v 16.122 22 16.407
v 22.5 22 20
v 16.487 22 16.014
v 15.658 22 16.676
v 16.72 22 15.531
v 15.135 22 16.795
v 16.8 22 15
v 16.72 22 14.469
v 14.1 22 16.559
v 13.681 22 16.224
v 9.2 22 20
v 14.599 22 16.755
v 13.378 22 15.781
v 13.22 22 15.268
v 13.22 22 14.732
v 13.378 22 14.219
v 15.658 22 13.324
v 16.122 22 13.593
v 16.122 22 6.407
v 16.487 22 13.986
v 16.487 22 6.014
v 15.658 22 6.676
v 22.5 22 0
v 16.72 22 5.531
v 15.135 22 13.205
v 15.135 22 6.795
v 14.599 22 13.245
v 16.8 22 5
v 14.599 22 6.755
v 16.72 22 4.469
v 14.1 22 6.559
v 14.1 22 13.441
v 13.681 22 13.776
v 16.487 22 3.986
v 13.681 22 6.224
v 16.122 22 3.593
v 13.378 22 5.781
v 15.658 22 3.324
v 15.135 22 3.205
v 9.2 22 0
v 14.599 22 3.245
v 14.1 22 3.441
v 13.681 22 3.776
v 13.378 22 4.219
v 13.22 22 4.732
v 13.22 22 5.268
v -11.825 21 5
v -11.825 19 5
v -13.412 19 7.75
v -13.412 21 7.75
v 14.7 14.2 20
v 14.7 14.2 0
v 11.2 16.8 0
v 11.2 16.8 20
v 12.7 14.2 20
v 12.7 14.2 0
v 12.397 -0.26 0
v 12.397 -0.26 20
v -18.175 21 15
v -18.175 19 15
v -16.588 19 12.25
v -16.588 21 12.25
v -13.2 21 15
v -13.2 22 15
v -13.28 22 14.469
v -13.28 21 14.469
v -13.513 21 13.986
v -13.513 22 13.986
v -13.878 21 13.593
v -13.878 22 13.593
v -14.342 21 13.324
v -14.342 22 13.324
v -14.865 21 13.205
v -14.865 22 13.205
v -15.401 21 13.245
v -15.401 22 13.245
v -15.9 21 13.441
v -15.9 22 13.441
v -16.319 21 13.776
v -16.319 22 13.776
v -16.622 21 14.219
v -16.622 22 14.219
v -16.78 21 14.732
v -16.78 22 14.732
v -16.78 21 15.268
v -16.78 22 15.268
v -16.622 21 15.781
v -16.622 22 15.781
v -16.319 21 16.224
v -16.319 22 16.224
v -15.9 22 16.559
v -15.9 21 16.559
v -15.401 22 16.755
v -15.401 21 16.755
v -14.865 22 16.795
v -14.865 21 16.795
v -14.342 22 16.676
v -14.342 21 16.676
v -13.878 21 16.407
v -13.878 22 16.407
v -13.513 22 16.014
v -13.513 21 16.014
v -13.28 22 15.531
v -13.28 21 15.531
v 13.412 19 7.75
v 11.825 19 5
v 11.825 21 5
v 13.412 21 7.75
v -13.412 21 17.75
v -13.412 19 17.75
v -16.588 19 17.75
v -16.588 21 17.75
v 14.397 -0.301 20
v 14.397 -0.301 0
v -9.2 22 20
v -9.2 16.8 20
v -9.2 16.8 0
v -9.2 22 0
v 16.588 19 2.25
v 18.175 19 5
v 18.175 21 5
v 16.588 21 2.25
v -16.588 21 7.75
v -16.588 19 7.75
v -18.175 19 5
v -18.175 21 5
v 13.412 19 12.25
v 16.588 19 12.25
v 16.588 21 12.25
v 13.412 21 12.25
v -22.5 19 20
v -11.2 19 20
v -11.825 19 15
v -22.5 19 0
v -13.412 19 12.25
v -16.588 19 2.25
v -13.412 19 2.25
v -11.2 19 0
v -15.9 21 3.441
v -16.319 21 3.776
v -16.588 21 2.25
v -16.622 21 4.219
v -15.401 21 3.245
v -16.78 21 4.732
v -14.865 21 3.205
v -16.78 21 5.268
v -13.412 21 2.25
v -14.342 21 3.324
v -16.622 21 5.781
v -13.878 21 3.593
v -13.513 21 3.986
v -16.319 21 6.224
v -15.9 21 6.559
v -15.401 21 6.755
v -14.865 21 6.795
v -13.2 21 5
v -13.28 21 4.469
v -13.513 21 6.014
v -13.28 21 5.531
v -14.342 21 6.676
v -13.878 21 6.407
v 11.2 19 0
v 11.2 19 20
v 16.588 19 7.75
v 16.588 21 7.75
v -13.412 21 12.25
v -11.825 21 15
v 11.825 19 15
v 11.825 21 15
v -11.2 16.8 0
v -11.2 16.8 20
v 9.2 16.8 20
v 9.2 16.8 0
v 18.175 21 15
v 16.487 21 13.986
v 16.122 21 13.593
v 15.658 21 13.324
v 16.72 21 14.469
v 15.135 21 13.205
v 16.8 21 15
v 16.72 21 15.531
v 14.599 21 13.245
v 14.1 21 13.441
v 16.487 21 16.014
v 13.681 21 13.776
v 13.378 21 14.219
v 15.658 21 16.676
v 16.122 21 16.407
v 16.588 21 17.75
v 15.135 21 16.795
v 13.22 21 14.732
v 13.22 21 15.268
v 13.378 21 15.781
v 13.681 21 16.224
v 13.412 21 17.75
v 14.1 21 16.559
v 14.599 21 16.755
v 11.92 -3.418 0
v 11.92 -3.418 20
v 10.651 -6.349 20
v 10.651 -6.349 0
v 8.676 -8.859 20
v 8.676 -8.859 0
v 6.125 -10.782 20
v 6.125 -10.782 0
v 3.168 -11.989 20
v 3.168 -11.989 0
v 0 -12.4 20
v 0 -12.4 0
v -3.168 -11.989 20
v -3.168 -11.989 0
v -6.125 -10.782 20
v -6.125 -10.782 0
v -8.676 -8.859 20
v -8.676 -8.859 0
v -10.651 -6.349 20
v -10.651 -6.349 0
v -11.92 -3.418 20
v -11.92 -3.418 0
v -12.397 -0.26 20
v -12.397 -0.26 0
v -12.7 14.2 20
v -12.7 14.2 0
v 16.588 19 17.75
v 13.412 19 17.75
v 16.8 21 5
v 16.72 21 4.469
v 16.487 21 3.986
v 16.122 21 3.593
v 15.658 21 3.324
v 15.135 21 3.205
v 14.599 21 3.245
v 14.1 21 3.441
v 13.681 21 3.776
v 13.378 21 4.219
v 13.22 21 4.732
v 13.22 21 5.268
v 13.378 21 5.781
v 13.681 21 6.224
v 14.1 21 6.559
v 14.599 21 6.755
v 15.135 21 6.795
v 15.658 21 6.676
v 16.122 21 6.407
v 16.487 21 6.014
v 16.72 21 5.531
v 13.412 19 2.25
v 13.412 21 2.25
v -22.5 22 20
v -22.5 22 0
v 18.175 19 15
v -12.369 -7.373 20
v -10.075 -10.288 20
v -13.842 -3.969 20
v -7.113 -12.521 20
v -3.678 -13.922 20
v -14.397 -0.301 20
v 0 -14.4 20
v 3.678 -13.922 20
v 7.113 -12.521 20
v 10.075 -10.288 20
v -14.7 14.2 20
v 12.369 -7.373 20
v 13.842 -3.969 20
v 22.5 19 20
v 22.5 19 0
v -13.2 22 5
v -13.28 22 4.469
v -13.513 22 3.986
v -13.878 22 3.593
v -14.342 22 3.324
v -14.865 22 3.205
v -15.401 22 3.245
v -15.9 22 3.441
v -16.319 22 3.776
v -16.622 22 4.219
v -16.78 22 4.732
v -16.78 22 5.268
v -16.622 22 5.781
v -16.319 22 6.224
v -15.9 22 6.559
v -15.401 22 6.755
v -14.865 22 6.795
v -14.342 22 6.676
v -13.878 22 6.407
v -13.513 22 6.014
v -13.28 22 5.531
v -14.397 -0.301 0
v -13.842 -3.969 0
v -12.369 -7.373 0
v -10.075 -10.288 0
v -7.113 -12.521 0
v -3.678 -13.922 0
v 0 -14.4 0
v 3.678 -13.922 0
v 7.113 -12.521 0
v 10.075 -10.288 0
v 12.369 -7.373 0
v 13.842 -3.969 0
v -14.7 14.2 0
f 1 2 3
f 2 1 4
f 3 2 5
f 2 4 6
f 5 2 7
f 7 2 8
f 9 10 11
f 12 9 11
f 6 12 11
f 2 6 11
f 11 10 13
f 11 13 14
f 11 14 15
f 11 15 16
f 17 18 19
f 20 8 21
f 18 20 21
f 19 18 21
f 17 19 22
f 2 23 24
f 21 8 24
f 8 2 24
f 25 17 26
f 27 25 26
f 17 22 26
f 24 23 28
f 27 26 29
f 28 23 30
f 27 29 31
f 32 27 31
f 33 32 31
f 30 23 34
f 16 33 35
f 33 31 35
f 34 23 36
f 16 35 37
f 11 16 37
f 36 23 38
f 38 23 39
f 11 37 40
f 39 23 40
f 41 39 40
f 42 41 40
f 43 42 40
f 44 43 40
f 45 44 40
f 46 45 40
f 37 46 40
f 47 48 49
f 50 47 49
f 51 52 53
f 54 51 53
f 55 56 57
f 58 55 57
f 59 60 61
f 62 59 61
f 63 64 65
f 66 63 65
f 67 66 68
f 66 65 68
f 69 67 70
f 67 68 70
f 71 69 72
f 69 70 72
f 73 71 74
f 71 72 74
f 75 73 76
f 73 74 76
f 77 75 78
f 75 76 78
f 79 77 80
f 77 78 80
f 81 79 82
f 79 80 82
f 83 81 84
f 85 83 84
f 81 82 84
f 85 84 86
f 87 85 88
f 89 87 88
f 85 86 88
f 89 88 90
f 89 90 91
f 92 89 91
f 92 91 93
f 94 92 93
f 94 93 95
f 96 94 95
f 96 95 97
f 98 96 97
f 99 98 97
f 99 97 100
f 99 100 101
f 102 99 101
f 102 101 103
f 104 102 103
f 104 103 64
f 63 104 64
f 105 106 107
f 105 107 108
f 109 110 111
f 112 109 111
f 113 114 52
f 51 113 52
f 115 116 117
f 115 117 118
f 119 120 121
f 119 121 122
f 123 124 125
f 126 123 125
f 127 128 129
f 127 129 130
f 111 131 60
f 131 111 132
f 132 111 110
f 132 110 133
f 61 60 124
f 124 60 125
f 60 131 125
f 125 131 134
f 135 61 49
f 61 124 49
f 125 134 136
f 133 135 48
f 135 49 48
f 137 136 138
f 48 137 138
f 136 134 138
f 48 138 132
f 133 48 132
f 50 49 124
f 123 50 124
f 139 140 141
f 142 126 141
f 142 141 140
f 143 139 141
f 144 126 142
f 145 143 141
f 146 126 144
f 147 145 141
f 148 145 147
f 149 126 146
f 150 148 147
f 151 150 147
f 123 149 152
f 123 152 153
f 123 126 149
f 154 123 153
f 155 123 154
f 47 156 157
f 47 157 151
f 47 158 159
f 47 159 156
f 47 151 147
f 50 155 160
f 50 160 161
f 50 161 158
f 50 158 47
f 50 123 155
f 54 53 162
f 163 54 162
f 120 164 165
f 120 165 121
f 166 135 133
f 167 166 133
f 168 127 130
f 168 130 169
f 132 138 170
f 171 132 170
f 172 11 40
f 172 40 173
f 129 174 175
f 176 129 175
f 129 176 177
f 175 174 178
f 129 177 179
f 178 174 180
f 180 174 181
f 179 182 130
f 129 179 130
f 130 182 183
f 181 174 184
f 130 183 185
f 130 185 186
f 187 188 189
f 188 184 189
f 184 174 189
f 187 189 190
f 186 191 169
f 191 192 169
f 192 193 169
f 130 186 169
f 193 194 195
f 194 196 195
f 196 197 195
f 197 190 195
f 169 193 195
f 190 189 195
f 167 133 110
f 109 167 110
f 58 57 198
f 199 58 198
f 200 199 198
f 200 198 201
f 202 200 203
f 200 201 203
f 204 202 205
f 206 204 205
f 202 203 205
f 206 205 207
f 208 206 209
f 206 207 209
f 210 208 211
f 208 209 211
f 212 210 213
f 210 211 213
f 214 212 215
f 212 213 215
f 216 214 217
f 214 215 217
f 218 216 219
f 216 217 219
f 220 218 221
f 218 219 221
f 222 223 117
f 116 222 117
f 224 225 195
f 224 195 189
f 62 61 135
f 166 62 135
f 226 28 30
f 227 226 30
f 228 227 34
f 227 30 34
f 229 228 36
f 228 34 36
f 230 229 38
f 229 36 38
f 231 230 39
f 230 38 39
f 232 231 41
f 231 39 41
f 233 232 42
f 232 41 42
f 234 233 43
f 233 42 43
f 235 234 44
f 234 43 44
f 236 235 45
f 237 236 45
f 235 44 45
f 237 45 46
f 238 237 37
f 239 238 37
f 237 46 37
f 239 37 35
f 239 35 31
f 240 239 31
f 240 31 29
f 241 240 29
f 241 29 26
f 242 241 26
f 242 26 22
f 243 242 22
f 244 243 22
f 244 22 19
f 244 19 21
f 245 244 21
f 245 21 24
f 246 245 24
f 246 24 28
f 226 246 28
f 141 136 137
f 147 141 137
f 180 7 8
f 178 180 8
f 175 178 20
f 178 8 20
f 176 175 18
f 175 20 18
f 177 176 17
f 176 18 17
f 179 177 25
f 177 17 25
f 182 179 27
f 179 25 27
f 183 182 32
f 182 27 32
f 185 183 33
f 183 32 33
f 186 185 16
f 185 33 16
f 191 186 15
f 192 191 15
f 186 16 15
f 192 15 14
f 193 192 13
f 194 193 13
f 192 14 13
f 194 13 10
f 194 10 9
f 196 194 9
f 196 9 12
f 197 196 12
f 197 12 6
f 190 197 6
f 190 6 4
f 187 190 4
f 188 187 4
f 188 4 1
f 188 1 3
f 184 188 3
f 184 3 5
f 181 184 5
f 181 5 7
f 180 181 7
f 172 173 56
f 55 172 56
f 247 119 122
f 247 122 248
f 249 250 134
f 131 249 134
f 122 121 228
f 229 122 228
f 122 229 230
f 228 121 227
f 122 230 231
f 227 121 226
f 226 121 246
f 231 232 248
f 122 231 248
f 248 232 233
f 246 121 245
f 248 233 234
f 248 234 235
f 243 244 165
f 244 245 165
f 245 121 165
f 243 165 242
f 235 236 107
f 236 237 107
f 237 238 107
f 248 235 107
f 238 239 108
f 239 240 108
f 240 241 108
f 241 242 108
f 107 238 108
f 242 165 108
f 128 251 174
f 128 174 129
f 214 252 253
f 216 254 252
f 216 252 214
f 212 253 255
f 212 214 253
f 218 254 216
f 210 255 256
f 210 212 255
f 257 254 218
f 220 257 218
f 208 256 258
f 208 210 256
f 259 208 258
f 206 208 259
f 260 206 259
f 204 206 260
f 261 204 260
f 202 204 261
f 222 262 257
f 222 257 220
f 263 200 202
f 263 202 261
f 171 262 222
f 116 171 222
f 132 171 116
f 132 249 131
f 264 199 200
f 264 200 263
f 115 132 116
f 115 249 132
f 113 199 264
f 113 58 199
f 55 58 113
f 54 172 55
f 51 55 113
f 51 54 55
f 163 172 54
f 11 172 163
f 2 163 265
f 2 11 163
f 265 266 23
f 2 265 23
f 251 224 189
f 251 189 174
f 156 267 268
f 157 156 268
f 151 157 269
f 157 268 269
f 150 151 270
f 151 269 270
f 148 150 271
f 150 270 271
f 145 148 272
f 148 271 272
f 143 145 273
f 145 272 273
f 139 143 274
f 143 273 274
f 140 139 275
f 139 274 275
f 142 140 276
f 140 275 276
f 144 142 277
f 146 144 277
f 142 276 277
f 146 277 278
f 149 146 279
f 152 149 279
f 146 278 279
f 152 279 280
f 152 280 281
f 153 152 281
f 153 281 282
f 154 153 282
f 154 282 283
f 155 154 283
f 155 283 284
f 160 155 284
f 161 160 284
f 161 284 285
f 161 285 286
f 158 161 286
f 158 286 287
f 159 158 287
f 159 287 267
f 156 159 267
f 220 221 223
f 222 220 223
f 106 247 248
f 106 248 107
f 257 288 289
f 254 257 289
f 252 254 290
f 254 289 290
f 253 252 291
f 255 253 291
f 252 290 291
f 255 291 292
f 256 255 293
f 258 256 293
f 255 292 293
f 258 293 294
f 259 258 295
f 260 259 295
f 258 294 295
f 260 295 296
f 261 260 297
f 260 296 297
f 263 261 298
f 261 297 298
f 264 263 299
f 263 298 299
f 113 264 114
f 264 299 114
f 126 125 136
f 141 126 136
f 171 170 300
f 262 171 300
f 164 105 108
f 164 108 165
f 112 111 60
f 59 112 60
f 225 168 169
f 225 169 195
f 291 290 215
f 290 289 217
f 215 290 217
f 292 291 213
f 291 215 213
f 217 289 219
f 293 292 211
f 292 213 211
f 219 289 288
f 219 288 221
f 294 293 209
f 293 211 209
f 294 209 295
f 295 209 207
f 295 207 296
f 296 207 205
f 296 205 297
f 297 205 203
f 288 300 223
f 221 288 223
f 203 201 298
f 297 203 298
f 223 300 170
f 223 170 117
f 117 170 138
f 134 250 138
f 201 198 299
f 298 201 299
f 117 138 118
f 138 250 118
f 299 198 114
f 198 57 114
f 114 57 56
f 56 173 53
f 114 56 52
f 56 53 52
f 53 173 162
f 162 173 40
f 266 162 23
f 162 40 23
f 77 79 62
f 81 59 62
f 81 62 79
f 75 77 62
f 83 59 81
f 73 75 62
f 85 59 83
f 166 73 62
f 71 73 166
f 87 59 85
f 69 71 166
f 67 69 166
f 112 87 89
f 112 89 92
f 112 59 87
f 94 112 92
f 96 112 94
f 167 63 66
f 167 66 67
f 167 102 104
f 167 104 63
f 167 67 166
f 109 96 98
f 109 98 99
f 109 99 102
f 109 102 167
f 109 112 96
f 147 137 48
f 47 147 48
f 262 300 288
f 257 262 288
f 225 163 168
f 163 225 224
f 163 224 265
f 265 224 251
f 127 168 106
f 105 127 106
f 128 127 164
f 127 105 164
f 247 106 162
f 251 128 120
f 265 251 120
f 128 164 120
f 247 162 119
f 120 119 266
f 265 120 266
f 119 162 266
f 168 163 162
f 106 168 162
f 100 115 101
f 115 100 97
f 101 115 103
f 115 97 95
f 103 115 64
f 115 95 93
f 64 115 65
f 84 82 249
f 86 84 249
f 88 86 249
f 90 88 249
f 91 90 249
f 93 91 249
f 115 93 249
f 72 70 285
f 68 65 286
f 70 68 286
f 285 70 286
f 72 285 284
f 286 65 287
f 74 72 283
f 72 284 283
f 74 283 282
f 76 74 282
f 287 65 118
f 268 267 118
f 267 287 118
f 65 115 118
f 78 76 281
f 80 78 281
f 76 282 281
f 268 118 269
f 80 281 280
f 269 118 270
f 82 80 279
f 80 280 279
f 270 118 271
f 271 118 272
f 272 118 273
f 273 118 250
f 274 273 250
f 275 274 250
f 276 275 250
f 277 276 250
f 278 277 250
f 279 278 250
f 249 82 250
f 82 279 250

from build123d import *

# Parameters (mm, degrees)
BOSS_EXTRUDE1_DEPTH      = 20
CUT_EXTRUDE1_DEPTH       = 2
M3_CLEARANCE_HOLE1_D     = 3.6
M3_CLEARANCE_HOLE1_DEPTH = 3


with BuildPart() as part:
    # Sketch1 → Boss-Extrude1 (new body)
    with BuildSketch(Plane.XY):
        with BuildLine():
            Line((-22.5, 19), (-11.2, 19))
            Line((-11.2, 19), (-11.2, 16.8))
            Line((-11.2, 16.8), (-14.700438244, 14.2))
            Line((-14.700438244, 14.2), (-14.396845337, -0.301403929))
            ThreePointArc((-14.396845337, -0.301403929), (0, -14.4), (14.396845337, -0.301403929))
            Line((14.396845337, -0.301403929), (14.700438244, 14.2))
            Line((14.700438244, 14.2), (11.2, 16.8))
            Line((11.2, 16.8), (11.2, 19))
            Line((11.2, 19), (22.5, 19))
            Line((22.5, 19), (22.5, 22))
            Line((22.5, 22), (9.2, 22))
            Line((9.2, 22), (9.2, 16.799674488))
            Line((9.2, 16.799674488), (12.7, 14.2))
            Line((12.7, 14.2), (12.397283485, -0.259542272))
            ThreePointArc((12.397283485, -0.259542272), (0, -12.4), (-12.397283485, -0.259542272))
            Line((-12.397283485, -0.259542272), (-12.7, 14.2))
            Line((-12.7, 14.2), (-9.2, 16.799674488))
            Line((-9.2, 16.799674488), (-9.2, 22))
            Line((-9.2, 22), (-22.5, 22))
            Line((-22.5, 22), (-22.5, 19))
        make_face()
    extrude(amount=BOSS_EXTRUDE1_DEPTH)

    # Sketch4 → Cut-Extrude1 (cut)
    with BuildSketch(Plane.XZ.offset(-19)):
        Polygon((-13.41228676, 2.25), (-11.824573519, 5), (-13.41228676, 7.75), (-16.58771324, 7.75), (-18.175426481, 5), (-16.58771324, 2.25), align=None)
        Polygon((-11.824573519, 15), (-13.41228676, 17.75), (-16.58771324, 17.75), (-18.175426481, 15), (-16.58771324, 12.25), (-13.41228676, 12.25), align=None)
        Polygon((13.41228676, 12.25), (11.824573519, 15), (13.41228676, 17.75), (16.58771324, 17.75), (18.175426481, 15), (16.58771324, 12.25), align=None)
        Polygon((16.58771324, 2.25), (13.41228676, 2.25), (11.824573519, 5), (13.41228676, 7.75), (16.58771324, 7.75), (18.175426481, 5), align=None)
    extrude(amount=-CUT_EXTRUDE1_DEPTH, mode=Mode.SUBTRACT)

    # M3 Clearance Hole1
    with Locations(Plane(origin=(0, 19, 0), x_dir=(-1, 0, 0), z_dir=(0, -1, 0))):
        with Locations((-15, -15), (15, -15), (-15, -5), (15, -5)):
            Hole(M3_CLEARANCE_HOLE1_D / 2, depth=M3_CLEARANCE_HOLE1_DEPTH)


solid = part.part
